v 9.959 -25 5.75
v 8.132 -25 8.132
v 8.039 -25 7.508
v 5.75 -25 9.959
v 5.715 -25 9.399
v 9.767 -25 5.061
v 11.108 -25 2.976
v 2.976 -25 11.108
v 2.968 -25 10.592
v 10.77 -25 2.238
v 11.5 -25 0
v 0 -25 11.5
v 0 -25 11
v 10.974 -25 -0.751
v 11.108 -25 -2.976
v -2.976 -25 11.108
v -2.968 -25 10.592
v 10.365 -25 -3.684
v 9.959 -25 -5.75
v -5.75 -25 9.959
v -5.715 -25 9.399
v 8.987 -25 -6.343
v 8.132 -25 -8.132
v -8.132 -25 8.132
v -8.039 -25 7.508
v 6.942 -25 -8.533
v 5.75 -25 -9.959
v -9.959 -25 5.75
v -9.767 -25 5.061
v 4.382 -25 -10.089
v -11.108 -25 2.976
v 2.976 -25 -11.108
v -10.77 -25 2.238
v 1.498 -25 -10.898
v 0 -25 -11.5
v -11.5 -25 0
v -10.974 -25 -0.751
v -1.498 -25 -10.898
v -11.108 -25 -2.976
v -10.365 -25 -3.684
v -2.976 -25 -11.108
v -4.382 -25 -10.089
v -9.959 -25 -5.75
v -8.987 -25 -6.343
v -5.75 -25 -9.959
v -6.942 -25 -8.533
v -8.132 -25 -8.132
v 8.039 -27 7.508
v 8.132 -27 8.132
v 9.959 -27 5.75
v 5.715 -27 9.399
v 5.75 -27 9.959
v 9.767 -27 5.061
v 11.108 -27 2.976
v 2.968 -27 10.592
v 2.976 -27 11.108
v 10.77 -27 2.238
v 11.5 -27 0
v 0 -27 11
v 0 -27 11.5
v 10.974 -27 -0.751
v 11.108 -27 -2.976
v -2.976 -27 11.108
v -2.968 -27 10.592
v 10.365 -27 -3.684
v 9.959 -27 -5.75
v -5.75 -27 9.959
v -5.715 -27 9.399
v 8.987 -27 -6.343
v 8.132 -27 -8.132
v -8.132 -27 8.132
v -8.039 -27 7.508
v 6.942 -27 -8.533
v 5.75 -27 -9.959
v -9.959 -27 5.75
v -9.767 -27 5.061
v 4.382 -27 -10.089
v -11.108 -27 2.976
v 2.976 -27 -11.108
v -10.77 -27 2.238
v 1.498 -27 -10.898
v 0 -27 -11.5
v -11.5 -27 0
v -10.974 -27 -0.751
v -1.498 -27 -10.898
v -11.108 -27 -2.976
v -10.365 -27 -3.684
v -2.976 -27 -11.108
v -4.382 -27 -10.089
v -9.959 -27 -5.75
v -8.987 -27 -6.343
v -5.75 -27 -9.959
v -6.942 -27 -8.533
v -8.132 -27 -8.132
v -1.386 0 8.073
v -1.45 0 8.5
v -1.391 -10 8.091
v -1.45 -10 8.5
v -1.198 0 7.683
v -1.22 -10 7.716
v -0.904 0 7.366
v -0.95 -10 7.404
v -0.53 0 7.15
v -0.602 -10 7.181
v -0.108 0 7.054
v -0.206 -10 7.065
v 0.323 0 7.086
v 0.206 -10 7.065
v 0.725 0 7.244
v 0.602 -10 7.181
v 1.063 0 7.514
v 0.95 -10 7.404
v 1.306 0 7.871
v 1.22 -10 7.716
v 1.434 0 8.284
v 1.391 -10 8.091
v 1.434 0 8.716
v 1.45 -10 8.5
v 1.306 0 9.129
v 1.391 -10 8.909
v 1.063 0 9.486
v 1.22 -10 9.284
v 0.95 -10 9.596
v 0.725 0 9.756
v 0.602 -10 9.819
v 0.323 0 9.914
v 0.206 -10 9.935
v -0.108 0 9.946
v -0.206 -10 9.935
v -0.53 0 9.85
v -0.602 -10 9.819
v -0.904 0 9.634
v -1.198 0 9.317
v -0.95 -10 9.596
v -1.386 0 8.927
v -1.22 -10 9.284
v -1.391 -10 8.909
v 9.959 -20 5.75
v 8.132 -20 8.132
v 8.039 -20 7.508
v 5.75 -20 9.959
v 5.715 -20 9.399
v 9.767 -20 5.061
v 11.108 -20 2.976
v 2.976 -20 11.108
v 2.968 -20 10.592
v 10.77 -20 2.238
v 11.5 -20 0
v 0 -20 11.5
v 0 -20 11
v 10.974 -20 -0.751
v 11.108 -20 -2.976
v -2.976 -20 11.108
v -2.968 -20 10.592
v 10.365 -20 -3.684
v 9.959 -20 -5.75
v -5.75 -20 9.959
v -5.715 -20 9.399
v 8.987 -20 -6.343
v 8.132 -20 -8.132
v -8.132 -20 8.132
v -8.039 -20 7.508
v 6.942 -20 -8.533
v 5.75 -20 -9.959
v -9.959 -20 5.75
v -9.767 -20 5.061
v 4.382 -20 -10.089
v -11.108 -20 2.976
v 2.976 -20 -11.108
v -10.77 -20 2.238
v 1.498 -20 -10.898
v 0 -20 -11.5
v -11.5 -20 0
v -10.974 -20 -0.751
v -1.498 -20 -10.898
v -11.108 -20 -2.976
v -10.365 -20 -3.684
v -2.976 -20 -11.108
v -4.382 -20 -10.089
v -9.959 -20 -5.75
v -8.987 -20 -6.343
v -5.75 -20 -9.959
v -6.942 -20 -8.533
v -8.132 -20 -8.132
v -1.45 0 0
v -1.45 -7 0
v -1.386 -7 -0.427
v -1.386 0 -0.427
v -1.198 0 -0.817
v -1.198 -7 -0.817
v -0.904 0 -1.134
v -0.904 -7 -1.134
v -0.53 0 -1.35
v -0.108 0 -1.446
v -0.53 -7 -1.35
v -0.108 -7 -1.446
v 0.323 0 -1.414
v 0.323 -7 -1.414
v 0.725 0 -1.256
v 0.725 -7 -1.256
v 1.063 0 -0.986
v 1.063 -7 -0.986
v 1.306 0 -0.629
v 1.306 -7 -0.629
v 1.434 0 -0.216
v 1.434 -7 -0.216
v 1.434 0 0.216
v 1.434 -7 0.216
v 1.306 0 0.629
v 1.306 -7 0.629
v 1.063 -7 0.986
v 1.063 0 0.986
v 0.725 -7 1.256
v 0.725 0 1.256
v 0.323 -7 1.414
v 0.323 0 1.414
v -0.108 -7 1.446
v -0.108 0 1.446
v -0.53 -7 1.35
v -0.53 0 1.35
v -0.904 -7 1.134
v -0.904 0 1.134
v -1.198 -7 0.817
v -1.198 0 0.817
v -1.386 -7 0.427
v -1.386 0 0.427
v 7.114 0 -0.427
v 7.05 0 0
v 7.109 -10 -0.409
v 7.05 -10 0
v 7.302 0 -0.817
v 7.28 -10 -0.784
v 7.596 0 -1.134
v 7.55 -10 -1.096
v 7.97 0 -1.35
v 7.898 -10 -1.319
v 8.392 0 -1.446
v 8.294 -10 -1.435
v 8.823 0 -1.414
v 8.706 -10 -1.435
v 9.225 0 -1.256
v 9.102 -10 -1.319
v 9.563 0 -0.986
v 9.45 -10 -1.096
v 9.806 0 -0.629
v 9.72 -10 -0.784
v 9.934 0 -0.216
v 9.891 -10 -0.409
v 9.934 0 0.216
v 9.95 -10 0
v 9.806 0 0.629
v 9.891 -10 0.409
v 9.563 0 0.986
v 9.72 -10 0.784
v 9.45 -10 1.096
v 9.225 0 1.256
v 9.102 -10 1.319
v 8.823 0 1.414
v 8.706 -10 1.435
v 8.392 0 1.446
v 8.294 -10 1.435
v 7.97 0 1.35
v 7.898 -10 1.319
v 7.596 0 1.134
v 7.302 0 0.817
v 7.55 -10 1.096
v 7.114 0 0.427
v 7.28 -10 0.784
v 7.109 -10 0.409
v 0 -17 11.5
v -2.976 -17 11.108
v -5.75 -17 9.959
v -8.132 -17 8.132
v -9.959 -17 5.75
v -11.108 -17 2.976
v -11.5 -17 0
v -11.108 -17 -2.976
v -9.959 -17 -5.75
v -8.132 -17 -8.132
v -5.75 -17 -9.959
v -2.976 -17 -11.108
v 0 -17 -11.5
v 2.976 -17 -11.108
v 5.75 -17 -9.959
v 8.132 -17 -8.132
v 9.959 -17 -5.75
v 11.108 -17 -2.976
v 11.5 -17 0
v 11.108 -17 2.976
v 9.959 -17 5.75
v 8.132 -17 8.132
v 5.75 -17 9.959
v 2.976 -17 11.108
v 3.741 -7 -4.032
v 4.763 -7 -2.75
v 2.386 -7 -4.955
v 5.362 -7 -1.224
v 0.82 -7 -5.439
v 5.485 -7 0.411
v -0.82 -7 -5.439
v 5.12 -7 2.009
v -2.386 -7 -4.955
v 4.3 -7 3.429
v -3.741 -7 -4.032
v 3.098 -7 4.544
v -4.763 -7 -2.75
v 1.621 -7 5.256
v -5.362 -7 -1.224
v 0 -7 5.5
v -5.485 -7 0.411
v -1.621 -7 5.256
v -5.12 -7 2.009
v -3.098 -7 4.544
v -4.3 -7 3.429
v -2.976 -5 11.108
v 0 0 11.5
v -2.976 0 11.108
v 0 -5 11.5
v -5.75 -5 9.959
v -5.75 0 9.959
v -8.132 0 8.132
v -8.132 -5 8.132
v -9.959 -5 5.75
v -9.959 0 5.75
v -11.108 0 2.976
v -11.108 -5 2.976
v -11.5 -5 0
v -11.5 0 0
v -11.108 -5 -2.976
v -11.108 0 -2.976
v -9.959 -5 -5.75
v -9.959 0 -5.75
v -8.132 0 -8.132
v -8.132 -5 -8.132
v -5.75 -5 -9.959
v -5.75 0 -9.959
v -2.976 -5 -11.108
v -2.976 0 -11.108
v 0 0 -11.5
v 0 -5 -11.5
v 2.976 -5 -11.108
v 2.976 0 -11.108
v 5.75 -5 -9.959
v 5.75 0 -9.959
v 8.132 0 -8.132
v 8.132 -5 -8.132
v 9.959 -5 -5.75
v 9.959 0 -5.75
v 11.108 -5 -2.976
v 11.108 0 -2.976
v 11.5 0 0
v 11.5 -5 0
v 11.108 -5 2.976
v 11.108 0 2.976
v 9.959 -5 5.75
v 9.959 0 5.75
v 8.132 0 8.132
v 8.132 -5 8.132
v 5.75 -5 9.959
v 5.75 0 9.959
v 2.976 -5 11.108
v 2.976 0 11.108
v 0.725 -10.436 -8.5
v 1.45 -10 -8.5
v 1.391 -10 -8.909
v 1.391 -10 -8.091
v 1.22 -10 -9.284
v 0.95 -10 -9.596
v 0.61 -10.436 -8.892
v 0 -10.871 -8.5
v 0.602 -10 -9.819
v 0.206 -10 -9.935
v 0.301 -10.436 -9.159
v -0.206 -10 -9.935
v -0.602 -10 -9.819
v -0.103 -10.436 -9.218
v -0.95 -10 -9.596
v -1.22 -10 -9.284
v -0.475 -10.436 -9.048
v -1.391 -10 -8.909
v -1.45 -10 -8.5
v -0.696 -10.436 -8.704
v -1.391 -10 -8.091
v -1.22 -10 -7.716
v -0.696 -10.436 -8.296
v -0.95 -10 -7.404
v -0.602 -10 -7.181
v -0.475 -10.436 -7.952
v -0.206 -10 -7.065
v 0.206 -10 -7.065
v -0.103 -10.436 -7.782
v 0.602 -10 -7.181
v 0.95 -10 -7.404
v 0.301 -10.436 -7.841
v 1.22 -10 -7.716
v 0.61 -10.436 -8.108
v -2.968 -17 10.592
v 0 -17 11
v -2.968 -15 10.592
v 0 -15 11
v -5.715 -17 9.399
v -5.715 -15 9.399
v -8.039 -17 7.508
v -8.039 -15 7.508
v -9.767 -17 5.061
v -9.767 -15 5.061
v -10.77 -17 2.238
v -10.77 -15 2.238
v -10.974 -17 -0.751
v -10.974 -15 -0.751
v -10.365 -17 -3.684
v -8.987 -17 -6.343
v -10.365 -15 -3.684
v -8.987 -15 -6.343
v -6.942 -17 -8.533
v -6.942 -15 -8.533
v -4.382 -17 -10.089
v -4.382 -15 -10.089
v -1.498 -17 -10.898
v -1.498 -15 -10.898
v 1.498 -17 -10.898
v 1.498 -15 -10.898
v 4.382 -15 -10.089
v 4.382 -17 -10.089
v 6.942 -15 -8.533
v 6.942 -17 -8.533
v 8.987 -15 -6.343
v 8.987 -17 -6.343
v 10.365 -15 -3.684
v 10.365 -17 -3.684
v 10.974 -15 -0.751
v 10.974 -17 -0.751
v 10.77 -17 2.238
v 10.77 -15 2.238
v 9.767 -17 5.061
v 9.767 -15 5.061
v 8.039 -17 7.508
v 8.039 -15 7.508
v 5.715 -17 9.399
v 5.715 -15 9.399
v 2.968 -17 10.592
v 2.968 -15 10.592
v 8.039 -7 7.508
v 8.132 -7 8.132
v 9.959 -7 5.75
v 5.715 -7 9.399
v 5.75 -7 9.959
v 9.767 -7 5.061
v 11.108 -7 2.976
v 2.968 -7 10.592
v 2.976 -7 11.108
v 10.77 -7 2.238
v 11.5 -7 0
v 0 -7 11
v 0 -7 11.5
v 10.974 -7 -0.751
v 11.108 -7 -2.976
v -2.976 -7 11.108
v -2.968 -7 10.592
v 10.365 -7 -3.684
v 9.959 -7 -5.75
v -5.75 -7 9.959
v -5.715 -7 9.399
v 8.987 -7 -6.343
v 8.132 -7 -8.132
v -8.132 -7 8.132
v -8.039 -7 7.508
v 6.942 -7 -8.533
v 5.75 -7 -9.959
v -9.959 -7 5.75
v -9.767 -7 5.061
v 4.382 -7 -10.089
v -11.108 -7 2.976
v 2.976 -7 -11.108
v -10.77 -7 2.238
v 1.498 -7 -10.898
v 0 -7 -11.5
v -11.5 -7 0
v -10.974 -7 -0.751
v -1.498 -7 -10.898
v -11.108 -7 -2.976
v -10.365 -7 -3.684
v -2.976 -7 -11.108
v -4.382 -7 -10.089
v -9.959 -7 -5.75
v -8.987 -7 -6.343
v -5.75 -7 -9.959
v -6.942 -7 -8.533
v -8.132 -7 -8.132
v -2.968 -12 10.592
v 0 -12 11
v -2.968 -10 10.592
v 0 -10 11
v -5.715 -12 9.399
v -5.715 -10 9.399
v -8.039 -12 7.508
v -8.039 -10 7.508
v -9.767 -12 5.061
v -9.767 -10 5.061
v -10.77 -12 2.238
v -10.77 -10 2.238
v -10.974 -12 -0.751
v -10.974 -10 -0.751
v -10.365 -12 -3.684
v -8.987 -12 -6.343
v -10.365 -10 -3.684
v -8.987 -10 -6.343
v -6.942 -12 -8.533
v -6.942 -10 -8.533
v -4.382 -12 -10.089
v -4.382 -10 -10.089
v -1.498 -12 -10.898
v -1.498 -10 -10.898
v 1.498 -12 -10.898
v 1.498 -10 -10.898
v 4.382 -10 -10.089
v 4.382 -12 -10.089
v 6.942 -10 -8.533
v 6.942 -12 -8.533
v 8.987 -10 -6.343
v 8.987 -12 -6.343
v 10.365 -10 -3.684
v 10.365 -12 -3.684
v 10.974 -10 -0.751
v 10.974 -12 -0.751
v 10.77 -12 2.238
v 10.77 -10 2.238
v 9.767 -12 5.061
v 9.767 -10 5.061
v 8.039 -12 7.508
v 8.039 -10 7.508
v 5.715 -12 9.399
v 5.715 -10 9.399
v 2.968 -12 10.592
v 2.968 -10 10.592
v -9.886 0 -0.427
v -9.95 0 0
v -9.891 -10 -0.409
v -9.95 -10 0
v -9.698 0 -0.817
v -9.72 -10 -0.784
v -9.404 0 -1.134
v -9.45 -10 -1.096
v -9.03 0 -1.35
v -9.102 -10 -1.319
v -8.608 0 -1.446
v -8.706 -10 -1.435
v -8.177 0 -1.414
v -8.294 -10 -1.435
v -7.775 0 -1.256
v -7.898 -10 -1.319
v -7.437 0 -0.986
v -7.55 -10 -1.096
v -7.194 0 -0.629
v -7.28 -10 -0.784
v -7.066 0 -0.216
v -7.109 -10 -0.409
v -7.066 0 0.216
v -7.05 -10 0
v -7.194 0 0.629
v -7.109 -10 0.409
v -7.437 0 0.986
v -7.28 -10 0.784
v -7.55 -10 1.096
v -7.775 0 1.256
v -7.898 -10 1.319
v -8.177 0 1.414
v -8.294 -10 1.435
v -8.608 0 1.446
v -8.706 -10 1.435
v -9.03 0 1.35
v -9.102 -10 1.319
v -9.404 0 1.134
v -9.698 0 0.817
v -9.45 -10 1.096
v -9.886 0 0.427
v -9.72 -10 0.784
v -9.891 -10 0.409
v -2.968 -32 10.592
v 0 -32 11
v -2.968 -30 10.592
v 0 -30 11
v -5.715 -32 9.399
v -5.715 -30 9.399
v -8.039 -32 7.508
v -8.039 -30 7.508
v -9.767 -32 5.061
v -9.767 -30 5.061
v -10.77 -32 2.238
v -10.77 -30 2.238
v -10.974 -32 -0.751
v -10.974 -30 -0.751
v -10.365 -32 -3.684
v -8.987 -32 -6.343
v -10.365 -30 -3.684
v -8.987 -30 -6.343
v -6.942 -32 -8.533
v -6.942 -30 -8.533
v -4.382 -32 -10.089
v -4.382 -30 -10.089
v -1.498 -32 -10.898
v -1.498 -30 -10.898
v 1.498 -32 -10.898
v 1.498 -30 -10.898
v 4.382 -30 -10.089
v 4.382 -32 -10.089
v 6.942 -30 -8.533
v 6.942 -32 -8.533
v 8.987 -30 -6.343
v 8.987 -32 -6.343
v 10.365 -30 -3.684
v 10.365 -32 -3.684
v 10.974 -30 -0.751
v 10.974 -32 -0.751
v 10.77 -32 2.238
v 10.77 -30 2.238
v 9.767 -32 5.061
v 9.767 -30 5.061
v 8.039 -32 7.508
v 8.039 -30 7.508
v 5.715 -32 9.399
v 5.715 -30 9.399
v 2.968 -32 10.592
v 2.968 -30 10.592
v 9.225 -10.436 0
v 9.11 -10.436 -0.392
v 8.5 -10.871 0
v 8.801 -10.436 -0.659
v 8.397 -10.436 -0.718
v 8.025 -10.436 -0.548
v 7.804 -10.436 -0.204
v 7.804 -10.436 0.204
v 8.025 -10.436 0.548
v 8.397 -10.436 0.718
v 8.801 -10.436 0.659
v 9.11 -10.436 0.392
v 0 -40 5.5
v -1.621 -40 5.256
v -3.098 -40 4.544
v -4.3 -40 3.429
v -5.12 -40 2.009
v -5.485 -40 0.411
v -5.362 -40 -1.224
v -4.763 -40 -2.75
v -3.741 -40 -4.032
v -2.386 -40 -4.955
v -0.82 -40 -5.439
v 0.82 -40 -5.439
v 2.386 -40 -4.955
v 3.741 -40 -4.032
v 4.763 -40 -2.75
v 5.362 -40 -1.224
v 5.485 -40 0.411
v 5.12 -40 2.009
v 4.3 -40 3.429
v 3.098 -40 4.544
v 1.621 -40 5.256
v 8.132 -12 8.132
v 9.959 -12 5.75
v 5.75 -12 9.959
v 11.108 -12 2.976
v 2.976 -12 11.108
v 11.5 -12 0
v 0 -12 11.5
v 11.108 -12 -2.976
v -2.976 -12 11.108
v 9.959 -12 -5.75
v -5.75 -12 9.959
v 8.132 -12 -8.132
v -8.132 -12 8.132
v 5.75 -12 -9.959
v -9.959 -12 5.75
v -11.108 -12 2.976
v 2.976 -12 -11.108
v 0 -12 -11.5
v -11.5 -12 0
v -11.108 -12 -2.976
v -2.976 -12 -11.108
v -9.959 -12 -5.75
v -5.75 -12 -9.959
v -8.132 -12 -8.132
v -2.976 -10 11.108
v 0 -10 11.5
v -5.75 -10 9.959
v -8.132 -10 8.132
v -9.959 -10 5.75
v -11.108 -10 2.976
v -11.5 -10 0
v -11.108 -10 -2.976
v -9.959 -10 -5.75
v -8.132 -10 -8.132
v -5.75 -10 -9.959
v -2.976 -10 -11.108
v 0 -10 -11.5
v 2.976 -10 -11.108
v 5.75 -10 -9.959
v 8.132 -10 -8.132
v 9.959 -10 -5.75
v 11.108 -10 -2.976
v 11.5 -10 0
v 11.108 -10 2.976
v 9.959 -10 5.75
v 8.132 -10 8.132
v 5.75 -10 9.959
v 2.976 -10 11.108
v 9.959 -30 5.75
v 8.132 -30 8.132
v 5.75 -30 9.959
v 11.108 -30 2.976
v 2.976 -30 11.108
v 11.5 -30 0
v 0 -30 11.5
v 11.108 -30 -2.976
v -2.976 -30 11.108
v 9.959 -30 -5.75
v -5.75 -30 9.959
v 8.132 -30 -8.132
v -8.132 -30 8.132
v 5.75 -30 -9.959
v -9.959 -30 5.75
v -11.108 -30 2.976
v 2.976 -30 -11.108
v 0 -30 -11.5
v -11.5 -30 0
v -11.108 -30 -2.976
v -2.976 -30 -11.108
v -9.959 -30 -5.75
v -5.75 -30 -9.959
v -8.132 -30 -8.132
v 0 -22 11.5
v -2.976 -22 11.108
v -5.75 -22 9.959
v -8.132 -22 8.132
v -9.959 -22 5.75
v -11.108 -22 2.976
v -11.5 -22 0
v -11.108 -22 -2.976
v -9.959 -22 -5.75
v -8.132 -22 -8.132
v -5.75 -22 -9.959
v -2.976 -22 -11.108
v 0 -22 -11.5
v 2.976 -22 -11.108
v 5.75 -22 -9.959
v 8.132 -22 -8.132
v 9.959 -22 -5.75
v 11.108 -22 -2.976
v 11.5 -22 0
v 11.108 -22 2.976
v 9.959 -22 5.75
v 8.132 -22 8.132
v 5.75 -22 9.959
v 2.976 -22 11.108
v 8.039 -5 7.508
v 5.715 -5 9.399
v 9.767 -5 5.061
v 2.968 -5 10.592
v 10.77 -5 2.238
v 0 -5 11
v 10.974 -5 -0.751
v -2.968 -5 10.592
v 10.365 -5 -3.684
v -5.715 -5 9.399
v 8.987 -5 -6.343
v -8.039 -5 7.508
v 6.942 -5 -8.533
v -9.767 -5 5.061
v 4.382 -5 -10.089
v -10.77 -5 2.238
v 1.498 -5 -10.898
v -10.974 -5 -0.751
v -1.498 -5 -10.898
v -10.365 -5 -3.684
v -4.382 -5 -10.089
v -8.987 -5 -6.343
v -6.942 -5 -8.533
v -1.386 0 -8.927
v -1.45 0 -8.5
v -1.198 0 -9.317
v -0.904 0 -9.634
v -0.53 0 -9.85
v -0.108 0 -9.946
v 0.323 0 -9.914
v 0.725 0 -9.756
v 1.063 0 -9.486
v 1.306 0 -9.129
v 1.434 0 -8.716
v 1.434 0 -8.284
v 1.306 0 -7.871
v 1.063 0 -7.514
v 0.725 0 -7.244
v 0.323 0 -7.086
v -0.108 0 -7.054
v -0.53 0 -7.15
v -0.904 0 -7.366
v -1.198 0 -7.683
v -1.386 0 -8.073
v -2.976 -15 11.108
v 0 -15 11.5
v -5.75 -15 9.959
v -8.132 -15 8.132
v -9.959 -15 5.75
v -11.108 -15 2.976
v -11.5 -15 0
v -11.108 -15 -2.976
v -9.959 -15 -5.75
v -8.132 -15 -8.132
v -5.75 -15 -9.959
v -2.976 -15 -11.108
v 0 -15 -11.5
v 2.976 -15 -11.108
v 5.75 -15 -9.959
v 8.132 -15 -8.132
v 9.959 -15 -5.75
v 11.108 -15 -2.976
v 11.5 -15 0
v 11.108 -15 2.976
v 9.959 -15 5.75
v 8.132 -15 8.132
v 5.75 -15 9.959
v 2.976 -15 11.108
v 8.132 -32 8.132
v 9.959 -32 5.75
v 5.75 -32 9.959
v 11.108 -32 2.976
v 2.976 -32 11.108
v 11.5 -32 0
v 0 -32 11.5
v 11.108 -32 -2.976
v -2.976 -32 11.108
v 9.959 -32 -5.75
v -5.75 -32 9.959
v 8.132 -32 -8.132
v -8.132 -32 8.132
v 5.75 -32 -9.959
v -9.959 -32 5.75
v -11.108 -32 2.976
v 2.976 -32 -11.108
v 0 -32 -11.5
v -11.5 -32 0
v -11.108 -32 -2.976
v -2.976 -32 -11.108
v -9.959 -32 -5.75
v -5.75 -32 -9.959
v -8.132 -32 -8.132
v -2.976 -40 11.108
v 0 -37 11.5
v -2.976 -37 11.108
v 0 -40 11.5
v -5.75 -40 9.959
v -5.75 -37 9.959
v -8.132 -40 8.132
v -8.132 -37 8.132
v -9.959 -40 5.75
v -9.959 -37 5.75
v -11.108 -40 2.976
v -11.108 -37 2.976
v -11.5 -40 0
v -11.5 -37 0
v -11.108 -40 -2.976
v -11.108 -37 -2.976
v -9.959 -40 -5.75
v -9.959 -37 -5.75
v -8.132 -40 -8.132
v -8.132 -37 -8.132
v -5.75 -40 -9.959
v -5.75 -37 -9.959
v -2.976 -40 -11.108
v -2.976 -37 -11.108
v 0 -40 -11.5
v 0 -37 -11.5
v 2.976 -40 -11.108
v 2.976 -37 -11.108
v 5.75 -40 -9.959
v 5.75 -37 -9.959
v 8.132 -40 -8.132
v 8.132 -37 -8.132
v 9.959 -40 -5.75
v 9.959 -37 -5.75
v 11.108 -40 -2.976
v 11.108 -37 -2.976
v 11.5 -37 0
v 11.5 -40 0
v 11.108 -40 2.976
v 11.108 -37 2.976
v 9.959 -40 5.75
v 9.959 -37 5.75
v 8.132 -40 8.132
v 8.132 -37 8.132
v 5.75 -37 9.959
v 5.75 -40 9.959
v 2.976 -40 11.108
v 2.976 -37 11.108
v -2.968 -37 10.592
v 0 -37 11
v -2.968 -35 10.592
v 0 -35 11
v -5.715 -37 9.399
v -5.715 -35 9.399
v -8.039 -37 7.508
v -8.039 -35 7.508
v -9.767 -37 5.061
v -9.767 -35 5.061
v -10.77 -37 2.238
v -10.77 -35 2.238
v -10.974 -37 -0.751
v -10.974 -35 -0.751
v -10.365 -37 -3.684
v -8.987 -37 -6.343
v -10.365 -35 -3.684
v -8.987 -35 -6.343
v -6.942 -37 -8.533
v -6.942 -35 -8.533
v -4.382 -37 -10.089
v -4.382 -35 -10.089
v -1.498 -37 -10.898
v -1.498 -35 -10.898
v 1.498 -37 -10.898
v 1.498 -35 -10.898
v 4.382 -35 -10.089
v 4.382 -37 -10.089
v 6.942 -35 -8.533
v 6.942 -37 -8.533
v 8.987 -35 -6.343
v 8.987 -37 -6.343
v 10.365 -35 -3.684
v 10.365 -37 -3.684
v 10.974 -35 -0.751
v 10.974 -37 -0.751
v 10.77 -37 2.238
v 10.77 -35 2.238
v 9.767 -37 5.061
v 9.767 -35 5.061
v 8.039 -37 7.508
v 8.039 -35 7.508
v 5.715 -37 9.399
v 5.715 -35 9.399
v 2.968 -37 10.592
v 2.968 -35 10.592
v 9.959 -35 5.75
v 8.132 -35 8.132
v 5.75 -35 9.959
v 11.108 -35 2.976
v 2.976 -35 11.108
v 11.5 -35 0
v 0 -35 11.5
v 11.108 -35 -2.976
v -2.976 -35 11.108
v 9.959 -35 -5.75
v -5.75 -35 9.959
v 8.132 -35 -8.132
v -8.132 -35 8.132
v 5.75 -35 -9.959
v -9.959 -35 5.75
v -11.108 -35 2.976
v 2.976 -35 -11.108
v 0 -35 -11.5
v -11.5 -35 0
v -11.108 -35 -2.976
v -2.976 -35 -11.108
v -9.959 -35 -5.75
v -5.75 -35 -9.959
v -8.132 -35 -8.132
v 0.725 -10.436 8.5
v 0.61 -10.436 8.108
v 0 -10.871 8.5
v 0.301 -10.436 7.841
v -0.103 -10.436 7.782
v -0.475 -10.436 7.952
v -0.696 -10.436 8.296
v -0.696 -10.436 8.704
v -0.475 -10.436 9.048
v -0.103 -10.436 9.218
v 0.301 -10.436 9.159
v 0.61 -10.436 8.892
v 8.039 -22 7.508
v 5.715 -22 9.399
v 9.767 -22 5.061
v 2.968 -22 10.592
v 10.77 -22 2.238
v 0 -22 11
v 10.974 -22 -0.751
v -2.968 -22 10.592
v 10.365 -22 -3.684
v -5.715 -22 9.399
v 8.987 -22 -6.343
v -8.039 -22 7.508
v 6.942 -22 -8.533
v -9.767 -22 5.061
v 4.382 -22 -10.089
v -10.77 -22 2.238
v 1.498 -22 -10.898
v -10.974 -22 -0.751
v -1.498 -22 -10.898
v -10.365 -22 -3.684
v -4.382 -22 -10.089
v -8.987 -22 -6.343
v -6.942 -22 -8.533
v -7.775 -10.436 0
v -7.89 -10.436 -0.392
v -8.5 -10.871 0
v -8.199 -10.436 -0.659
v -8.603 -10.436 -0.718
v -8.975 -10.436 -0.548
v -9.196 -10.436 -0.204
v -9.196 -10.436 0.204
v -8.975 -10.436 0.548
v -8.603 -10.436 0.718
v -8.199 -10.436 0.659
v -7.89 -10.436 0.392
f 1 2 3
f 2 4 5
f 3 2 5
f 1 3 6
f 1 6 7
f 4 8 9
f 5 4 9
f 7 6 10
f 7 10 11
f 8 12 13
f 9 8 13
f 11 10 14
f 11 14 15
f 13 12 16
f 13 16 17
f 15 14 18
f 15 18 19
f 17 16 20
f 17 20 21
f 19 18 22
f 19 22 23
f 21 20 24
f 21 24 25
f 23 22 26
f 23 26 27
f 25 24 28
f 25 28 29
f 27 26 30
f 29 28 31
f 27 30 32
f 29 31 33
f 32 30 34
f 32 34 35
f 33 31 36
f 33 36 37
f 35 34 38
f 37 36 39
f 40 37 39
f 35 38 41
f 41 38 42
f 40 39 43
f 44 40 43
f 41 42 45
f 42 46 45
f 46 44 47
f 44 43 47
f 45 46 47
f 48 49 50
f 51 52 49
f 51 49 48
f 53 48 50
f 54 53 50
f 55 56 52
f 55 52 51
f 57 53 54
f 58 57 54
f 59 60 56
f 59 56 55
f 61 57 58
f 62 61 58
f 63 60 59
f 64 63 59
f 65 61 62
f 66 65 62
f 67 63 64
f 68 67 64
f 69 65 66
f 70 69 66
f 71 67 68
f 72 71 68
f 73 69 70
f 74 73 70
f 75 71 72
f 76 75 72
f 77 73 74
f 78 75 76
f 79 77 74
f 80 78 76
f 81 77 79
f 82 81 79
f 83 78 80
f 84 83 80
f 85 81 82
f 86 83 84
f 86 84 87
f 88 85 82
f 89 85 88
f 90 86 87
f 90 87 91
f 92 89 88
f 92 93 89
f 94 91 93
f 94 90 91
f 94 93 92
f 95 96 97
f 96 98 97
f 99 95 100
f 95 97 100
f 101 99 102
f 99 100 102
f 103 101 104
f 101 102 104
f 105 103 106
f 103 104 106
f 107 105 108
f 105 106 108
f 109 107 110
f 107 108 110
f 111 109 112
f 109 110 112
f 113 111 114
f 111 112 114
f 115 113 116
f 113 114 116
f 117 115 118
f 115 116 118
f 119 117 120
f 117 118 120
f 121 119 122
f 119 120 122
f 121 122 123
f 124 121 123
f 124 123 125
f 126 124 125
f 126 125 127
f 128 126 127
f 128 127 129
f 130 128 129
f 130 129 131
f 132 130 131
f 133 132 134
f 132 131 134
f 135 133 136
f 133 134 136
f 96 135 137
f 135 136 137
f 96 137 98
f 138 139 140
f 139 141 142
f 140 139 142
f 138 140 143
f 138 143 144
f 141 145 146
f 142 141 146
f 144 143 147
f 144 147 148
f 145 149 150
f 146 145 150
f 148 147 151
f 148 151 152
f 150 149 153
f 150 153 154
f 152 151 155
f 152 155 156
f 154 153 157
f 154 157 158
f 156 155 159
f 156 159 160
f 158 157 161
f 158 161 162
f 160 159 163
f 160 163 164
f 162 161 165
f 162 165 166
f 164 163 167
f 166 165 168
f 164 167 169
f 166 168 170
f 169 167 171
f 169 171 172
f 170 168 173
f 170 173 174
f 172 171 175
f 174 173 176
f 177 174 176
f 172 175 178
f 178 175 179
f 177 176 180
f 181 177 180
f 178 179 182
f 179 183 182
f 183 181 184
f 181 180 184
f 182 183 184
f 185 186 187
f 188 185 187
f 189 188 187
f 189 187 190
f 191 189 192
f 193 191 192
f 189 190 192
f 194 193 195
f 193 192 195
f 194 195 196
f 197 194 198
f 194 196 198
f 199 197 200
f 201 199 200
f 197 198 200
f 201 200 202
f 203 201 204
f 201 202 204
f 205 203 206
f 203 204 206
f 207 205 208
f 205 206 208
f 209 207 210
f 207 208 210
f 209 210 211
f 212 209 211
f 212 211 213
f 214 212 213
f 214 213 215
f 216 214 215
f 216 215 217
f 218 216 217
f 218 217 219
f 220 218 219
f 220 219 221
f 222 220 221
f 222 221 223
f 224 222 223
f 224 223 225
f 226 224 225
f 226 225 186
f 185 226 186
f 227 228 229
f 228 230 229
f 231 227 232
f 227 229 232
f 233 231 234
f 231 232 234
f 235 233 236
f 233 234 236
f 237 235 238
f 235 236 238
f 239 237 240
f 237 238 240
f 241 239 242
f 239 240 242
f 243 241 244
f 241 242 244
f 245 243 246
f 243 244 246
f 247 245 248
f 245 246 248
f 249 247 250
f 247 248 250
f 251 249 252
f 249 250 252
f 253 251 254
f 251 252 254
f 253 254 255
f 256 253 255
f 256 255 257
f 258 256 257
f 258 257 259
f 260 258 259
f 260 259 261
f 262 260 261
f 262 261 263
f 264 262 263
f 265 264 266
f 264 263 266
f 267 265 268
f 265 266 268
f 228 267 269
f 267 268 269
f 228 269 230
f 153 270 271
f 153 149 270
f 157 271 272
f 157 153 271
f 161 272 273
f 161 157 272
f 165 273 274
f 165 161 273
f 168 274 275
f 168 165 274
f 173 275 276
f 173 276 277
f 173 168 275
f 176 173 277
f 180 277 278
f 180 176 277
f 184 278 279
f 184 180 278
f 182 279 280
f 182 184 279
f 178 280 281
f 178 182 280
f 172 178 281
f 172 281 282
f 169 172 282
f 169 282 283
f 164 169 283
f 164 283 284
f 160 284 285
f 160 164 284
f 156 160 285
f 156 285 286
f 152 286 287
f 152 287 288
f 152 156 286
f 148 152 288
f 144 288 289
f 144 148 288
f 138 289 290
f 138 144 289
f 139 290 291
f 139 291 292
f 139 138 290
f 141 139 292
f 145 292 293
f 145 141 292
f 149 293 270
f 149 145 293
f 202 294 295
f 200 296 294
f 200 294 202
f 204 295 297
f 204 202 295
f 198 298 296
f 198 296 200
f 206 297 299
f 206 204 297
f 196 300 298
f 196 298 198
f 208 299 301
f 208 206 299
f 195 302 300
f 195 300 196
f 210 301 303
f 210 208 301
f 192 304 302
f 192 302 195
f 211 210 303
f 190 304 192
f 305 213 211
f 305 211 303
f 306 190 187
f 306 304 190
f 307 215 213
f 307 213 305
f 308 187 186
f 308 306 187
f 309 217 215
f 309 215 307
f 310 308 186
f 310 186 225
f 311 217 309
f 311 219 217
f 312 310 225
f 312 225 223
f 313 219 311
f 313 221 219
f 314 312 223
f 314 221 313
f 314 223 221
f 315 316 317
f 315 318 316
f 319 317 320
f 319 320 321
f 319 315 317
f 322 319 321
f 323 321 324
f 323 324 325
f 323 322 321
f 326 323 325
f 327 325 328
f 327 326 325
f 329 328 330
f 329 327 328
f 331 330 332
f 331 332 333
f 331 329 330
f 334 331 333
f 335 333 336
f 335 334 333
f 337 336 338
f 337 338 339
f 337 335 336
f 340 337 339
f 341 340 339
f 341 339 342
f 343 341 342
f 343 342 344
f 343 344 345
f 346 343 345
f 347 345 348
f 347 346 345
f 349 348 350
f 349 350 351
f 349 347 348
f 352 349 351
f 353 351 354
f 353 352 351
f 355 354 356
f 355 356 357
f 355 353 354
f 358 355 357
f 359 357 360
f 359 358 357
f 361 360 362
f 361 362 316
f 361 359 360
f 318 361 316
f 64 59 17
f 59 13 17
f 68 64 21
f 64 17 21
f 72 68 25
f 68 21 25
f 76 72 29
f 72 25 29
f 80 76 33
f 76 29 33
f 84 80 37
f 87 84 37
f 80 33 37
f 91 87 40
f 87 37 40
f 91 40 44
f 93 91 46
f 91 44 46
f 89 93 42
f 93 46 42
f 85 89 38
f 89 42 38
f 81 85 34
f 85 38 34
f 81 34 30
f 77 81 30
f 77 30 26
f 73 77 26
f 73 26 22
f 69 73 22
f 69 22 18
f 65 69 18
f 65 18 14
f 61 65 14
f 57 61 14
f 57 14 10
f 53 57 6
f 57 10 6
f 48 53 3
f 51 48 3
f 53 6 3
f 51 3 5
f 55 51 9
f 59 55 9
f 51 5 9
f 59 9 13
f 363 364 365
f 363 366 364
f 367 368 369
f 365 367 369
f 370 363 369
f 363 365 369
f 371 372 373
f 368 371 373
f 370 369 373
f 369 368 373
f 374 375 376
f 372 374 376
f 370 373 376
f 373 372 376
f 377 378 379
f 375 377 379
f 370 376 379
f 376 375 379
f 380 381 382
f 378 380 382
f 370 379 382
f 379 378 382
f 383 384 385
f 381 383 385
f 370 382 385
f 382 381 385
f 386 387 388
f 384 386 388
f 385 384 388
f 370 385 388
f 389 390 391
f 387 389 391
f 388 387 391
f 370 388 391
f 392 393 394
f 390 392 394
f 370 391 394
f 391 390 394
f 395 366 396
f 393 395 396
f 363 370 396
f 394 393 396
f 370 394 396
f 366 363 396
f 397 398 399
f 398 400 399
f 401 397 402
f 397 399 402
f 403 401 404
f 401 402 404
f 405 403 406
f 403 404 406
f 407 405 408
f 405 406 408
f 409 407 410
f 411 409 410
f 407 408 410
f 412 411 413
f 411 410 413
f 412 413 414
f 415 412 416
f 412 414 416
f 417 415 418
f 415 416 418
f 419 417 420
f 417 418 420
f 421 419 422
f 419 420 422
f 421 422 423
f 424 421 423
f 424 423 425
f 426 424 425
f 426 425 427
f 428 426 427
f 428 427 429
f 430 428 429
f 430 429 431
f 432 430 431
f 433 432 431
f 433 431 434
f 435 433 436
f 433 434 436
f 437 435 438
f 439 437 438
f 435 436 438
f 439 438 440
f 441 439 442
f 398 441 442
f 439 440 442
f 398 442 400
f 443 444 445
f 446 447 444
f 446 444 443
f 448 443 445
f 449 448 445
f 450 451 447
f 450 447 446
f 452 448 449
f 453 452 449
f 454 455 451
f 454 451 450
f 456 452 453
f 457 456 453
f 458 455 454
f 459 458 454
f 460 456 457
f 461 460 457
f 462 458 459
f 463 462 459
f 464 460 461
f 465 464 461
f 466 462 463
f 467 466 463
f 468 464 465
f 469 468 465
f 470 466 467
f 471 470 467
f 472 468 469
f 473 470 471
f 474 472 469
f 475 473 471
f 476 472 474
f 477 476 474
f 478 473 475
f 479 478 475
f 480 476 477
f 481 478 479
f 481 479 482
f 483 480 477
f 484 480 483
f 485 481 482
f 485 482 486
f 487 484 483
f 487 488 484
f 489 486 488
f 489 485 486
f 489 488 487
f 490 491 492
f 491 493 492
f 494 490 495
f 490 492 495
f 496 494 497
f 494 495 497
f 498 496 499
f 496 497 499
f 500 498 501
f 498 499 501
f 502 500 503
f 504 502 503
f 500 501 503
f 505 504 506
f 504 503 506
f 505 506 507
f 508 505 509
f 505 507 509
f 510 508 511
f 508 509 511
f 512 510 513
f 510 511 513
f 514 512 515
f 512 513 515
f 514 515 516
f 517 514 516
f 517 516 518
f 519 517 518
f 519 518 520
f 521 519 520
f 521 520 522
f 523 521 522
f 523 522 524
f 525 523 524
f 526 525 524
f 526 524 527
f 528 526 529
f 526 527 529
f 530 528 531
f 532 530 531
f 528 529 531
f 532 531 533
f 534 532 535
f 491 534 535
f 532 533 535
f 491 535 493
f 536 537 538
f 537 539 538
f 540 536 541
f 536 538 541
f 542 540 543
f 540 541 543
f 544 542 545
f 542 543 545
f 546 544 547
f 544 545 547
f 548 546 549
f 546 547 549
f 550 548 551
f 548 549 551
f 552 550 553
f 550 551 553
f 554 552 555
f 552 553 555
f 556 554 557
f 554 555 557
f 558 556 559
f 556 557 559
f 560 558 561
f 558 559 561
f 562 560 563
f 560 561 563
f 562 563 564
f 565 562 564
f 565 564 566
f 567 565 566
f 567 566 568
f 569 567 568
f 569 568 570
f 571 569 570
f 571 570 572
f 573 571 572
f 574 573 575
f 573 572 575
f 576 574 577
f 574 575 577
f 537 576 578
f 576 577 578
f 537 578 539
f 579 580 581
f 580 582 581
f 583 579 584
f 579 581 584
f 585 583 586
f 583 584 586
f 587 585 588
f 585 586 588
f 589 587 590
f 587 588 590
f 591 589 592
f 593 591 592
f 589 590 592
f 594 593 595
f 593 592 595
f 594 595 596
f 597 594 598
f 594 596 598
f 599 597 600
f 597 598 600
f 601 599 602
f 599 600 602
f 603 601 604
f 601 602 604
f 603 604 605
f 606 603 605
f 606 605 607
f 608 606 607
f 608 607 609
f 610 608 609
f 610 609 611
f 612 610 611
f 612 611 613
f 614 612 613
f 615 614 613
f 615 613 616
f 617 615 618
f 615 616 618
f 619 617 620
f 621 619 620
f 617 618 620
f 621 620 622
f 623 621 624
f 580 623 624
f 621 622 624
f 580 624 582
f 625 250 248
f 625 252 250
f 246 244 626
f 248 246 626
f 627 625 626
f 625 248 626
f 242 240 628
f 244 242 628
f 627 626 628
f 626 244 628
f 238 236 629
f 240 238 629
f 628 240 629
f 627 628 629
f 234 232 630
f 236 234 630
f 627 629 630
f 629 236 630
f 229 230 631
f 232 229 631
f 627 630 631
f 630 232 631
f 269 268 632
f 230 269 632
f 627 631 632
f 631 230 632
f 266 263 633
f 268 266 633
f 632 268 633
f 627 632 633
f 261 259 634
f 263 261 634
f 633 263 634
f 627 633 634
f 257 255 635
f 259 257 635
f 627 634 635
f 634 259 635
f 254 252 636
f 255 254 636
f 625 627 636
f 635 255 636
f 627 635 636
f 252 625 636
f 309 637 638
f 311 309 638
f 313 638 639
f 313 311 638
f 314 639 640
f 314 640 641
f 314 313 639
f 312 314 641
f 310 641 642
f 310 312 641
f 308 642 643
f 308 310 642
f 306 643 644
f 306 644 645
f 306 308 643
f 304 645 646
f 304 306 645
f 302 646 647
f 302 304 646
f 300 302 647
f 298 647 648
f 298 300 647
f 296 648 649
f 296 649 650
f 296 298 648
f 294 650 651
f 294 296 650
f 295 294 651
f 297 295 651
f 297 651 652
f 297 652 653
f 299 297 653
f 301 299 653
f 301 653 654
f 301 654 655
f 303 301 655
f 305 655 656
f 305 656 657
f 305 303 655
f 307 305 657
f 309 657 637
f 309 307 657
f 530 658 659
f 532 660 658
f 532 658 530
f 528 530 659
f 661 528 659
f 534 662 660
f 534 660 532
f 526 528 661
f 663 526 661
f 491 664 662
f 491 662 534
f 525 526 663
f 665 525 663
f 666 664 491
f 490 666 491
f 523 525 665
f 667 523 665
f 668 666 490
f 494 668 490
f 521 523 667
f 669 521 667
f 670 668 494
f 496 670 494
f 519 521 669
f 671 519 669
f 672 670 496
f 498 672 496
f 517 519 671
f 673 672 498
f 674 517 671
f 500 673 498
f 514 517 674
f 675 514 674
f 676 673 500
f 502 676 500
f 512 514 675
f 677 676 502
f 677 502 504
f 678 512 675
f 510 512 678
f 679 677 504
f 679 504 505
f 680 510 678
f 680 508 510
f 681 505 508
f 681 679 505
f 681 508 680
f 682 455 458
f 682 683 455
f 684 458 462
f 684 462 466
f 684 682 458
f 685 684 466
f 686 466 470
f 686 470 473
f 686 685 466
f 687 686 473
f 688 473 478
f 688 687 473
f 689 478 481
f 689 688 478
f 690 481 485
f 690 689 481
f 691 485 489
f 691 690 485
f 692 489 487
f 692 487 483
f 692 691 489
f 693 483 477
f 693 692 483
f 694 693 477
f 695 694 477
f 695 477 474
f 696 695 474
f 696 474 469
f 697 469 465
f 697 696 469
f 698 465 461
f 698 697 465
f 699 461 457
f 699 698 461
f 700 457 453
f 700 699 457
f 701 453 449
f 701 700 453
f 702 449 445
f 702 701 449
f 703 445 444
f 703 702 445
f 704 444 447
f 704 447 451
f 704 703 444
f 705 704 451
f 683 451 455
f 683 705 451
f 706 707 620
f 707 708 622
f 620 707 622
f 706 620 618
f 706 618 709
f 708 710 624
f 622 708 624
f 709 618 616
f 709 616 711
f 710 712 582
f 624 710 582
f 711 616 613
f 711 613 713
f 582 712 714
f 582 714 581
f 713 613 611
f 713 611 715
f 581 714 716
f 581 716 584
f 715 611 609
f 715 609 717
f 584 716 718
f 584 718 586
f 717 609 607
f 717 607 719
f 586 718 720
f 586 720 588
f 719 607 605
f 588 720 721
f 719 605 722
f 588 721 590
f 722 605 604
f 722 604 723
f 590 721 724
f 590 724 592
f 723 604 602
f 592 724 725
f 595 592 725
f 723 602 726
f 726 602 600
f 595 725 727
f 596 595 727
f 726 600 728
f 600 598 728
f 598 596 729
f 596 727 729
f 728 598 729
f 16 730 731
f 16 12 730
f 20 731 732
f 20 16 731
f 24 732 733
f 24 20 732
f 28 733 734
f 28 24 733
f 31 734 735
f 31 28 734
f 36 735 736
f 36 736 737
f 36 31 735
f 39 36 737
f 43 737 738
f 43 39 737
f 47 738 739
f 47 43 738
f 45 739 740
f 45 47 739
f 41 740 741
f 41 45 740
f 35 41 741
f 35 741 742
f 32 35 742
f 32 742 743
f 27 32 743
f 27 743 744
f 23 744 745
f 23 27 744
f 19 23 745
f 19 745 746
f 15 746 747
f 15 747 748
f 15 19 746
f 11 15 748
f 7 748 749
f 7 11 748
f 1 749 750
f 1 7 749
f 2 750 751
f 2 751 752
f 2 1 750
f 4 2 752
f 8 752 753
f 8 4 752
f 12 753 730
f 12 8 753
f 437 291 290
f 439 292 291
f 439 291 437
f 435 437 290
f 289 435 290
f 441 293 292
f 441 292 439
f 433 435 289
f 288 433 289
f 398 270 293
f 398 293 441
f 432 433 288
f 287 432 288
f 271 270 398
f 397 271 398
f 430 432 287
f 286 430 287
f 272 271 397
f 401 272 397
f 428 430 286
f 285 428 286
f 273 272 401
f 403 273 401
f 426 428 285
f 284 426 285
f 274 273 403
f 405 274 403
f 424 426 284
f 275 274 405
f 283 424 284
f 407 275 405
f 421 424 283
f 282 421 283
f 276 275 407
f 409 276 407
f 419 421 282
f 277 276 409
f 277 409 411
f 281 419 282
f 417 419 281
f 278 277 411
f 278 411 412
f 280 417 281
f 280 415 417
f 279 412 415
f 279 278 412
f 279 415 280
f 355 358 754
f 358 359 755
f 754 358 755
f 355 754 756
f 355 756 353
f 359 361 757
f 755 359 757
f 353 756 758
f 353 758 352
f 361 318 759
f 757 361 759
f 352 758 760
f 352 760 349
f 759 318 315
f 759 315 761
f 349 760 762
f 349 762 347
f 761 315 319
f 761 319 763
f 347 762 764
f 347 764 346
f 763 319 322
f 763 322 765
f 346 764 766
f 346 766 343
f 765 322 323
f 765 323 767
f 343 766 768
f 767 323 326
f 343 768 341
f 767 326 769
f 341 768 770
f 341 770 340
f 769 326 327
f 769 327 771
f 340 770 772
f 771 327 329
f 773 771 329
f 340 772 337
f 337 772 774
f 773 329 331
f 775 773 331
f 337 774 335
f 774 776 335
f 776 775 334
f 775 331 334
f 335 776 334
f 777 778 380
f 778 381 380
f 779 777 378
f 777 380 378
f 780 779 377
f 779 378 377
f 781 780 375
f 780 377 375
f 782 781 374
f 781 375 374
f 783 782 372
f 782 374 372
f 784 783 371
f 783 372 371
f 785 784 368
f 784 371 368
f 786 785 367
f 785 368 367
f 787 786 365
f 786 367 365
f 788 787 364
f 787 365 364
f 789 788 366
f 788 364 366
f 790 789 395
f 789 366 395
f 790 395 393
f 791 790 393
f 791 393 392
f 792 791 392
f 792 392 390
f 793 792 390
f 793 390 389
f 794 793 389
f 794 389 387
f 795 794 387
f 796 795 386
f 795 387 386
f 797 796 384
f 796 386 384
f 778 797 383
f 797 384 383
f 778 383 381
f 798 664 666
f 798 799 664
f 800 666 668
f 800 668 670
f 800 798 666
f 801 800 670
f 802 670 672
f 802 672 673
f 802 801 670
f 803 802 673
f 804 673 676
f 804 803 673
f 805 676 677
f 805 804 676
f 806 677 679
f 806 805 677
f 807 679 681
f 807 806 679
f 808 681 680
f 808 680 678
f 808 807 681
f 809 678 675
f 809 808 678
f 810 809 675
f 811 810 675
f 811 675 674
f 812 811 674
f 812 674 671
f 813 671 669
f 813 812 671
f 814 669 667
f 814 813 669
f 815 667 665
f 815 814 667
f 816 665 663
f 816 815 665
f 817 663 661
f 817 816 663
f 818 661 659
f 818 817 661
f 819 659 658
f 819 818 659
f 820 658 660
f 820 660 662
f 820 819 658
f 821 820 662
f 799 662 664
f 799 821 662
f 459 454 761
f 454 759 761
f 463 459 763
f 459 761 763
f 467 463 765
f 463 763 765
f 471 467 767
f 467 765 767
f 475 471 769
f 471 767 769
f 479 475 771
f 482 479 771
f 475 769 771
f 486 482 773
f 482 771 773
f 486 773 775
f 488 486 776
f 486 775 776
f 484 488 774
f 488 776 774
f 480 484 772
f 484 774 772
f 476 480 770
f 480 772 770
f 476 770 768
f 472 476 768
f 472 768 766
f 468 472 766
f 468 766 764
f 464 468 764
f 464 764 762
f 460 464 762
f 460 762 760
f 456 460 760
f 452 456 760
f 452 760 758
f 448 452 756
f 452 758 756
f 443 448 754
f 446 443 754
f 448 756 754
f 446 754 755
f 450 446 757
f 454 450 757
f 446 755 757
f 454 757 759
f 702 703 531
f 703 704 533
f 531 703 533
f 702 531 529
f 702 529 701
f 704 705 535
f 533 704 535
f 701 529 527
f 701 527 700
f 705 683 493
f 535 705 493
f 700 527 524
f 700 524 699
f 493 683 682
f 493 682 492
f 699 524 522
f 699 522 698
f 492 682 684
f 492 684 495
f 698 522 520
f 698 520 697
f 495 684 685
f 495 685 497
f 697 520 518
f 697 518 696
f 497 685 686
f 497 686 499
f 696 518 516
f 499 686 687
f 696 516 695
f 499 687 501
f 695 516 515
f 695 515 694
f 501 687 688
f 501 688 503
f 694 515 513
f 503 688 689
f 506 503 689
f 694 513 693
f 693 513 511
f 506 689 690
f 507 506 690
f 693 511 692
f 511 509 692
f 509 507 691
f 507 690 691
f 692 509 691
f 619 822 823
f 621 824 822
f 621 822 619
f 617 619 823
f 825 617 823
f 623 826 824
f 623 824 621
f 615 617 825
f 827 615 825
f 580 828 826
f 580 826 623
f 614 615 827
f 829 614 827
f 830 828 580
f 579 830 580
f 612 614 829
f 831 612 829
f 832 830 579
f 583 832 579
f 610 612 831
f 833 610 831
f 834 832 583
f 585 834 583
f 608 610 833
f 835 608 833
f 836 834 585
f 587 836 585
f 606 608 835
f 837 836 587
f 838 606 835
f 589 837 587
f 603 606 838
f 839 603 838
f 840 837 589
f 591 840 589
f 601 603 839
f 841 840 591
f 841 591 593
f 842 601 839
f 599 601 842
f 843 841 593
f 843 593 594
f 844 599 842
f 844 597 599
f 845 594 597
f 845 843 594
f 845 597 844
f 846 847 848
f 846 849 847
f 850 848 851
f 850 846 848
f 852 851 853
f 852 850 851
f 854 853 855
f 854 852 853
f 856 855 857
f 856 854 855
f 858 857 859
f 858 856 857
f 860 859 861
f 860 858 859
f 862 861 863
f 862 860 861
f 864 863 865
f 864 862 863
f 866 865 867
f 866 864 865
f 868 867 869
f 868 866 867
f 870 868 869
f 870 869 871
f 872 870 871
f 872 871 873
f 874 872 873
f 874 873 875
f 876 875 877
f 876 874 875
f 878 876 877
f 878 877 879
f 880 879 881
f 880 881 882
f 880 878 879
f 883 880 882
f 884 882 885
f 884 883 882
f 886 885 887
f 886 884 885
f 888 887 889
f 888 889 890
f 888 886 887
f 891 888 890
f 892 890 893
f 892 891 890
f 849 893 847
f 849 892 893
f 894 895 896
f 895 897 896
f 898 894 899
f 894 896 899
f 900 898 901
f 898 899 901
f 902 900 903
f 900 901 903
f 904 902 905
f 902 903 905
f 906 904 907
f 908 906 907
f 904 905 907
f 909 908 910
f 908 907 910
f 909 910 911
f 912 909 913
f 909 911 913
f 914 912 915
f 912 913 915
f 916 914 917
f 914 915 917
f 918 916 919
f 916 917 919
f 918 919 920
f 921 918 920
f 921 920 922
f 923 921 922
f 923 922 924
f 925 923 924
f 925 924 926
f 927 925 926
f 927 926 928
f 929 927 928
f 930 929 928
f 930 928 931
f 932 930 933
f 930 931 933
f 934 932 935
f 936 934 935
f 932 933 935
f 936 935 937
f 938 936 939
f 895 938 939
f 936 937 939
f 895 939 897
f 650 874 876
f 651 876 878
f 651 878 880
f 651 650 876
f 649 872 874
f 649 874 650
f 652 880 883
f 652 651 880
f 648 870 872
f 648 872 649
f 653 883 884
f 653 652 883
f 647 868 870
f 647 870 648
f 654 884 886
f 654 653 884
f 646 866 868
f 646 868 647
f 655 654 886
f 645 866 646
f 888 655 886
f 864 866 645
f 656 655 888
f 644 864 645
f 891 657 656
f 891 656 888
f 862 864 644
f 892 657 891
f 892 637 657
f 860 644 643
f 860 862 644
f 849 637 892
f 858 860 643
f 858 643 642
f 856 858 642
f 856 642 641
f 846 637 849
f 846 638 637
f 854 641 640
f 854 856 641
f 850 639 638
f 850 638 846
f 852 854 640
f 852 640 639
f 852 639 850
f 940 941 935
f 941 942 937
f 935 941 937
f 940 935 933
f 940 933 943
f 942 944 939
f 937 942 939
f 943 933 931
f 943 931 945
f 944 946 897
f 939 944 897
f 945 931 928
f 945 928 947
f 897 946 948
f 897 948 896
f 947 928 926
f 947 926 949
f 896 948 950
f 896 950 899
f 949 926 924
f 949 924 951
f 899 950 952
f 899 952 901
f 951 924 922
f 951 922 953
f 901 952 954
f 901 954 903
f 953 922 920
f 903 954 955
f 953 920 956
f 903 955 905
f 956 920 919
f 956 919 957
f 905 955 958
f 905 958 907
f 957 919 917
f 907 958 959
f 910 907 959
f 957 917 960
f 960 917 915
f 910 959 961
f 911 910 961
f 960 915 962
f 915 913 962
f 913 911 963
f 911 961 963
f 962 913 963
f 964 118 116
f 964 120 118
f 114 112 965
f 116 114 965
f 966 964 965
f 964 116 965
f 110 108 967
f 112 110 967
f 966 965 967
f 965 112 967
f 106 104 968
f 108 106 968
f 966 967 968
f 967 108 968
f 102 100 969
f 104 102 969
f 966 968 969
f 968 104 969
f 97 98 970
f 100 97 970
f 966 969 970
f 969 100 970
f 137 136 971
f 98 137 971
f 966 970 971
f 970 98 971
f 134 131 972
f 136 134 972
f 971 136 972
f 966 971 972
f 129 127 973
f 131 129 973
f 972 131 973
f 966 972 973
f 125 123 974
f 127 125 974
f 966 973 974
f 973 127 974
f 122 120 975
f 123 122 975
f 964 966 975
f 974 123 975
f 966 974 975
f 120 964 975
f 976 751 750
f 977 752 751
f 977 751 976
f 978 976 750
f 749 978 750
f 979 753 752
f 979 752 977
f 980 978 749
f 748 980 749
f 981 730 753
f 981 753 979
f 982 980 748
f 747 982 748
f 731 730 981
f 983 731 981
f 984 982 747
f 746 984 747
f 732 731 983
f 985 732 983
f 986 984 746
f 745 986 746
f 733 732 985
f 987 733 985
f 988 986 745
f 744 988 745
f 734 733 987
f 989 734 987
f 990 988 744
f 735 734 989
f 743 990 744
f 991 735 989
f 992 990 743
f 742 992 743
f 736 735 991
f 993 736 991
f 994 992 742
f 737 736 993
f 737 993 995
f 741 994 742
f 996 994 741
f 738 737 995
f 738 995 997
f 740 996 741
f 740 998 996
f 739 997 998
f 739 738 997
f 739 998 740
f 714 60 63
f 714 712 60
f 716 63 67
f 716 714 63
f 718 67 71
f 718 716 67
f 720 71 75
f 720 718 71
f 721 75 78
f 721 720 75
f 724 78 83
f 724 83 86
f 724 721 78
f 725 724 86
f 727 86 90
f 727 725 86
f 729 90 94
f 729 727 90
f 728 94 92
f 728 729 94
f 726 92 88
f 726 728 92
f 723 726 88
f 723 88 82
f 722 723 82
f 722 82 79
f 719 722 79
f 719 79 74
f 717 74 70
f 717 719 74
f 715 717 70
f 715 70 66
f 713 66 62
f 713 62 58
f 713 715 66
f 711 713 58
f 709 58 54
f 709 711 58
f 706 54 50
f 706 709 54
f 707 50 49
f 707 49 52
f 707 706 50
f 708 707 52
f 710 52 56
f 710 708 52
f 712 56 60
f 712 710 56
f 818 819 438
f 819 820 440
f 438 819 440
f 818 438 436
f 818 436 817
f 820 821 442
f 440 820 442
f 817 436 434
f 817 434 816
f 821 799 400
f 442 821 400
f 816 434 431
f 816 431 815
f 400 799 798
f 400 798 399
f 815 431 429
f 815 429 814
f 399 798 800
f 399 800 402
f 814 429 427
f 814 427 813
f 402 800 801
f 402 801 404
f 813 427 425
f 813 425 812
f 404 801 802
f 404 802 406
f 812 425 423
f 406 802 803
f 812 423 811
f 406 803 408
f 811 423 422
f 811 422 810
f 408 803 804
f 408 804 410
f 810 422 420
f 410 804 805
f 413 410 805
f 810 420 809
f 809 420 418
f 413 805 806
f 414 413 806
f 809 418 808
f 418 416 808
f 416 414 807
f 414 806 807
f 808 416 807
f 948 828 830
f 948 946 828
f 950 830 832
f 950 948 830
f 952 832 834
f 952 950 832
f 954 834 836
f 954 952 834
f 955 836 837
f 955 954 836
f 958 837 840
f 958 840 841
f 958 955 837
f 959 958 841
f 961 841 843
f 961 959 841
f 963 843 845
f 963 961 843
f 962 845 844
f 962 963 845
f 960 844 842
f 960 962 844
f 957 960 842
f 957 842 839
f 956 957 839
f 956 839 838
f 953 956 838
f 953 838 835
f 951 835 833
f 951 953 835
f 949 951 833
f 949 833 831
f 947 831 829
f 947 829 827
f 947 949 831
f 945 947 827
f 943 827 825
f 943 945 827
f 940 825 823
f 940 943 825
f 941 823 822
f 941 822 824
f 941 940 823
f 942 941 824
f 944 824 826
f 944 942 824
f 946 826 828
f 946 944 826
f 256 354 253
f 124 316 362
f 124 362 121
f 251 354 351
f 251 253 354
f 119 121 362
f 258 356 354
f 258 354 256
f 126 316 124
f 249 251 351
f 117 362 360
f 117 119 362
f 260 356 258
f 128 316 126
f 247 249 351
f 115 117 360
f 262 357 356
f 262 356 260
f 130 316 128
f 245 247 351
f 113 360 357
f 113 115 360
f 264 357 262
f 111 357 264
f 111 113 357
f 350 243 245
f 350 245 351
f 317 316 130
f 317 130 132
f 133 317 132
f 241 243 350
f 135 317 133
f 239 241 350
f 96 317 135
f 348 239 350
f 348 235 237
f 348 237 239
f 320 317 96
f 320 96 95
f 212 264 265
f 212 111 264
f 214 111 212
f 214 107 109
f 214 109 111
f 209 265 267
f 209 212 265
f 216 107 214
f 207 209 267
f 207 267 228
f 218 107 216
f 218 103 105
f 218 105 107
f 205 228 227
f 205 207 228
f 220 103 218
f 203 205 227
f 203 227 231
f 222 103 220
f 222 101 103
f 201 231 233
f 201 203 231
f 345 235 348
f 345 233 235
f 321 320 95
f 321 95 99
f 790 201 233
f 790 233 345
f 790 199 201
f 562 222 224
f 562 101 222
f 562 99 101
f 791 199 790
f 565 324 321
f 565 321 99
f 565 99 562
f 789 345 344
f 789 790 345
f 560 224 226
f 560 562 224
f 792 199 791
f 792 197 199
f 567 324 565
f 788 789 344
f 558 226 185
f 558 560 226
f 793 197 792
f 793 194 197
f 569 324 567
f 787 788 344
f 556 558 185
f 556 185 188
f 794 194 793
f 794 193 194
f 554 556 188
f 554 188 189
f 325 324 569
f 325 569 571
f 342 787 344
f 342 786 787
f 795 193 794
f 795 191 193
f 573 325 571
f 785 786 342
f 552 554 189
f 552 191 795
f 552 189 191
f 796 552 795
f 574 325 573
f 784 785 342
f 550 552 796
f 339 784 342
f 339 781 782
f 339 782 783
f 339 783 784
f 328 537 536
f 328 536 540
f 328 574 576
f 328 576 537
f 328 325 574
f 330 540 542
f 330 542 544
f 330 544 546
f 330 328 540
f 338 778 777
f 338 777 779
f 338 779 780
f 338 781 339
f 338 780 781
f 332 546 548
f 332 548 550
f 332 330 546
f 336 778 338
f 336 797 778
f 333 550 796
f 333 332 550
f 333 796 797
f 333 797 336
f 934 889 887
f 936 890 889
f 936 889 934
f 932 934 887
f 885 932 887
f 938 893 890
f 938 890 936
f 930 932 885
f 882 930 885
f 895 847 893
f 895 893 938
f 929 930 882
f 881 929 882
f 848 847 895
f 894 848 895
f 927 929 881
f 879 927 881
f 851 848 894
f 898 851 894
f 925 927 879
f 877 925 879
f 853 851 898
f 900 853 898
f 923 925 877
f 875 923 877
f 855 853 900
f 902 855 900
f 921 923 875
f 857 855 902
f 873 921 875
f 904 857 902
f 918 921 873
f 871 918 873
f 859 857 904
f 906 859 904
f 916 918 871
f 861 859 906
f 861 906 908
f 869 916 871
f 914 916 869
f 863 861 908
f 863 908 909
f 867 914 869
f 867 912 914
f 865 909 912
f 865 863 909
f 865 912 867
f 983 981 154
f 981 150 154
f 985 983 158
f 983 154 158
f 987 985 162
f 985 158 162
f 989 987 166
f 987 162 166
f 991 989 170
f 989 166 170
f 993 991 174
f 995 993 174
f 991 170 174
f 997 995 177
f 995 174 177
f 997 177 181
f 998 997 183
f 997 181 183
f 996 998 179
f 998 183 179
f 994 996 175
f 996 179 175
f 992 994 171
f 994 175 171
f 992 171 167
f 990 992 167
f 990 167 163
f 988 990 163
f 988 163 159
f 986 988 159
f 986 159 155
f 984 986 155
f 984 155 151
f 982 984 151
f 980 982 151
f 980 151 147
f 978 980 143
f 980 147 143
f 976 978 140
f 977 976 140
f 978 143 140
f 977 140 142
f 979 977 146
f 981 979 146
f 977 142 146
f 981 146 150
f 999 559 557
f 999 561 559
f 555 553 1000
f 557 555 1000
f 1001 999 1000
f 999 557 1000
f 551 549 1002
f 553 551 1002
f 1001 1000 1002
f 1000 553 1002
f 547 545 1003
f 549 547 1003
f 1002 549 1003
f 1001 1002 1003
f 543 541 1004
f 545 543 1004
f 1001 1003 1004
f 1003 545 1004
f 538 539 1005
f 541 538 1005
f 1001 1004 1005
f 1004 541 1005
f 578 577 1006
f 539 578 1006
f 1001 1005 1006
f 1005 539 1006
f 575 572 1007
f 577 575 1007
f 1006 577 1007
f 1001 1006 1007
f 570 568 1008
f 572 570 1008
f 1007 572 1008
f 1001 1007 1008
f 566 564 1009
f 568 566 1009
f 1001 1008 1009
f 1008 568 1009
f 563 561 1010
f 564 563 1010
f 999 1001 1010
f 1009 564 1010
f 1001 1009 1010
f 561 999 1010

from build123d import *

# Parameters (mm, degrees)
SKETCH3_W                   = 0.5
SKETCH3_H                   = 2
LPATTERN1_COUNT             = 7
LPATTERN1_PITCH             = 5
M3_5X0_6_TAPPED_HOLE1_D     = 2.9
M3_5X0_6_TAPPED_HOLE1_DEPTH = 10
M3_5X0_6_TAPPED_HOLE1_TIP   = 0.871247898


with BuildPart() as part:
    # Sketch2 → Revolve1 (revolve)
    with BuildSketch(Plane.XY, mode=Mode.PRIVATE) as revolve1_sk:
        Polygon((0, 0), (-11.5, 0), (-11.5, -40), (-5.5, -40), (-5.5, -7), (0, -7), align=None)
    revolve(revolve1_sk.sketch.rotate(Axis((0, 0, 0), (0, -1, 0)), 270), axis=Axis((0, 0, 0), (0, -1, 0)))

    # Sketch3 → Cut-Revolve1 (revolve, cut)
    with BuildSketch(Plane.XY, mode=Mode.PRIVATE) as cut_revolve1_sk:
        with Locations((11.25, -36)):
            Rectangle(SKETCH3_W, SKETCH3_H)
    cut_revolve1 = revolve(cut_revolve1_sk.sketch.rotate(Axis((0, 0, 0), (0, -1, 0)), 90), axis=Axis((0, 0, 0), (0, -1, 0)), mode=Mode.SUBTRACT)

    # LPattern1: Cut-Revolve1 ×7
    with Locations(*[(0, i * LPATTERN1_PITCH, 0) for i in range(1, LPATTERN1_COUNT)]):
        add(cut_revolve1, mode=Mode.SUBTRACT)

    # M3.5x0.6 Tapped Hole1
    with Locations(Plane(origin=(0, 0, 0), x_dir=(1, 0, 0), z_dir=(0, 1, 0))):
        with Locations((8.5, 0), (0, 0), (-8.5, 0), (0, 8.5), (0, -8.5)):
            Hole(M3_5X0_6_TAPPED_HOLE1_D / 2, depth=M3_5X0_6_TAPPED_HOLE1_DEPTH)
            with Locations((0, 0, -(M3_5X0_6_TAPPED_HOLE1_DEPTH + M3_5X0_6_TAPPED_HOLE1_TIP / 2))):  # 118° drill point
                Cone(0, M3_5X0_6_TAPPED_HOLE1_D / 2, M3_5X0_6_TAPPED_HOLE1_TIP, mode=Mode.SUBTRACT)


solid = part.part
